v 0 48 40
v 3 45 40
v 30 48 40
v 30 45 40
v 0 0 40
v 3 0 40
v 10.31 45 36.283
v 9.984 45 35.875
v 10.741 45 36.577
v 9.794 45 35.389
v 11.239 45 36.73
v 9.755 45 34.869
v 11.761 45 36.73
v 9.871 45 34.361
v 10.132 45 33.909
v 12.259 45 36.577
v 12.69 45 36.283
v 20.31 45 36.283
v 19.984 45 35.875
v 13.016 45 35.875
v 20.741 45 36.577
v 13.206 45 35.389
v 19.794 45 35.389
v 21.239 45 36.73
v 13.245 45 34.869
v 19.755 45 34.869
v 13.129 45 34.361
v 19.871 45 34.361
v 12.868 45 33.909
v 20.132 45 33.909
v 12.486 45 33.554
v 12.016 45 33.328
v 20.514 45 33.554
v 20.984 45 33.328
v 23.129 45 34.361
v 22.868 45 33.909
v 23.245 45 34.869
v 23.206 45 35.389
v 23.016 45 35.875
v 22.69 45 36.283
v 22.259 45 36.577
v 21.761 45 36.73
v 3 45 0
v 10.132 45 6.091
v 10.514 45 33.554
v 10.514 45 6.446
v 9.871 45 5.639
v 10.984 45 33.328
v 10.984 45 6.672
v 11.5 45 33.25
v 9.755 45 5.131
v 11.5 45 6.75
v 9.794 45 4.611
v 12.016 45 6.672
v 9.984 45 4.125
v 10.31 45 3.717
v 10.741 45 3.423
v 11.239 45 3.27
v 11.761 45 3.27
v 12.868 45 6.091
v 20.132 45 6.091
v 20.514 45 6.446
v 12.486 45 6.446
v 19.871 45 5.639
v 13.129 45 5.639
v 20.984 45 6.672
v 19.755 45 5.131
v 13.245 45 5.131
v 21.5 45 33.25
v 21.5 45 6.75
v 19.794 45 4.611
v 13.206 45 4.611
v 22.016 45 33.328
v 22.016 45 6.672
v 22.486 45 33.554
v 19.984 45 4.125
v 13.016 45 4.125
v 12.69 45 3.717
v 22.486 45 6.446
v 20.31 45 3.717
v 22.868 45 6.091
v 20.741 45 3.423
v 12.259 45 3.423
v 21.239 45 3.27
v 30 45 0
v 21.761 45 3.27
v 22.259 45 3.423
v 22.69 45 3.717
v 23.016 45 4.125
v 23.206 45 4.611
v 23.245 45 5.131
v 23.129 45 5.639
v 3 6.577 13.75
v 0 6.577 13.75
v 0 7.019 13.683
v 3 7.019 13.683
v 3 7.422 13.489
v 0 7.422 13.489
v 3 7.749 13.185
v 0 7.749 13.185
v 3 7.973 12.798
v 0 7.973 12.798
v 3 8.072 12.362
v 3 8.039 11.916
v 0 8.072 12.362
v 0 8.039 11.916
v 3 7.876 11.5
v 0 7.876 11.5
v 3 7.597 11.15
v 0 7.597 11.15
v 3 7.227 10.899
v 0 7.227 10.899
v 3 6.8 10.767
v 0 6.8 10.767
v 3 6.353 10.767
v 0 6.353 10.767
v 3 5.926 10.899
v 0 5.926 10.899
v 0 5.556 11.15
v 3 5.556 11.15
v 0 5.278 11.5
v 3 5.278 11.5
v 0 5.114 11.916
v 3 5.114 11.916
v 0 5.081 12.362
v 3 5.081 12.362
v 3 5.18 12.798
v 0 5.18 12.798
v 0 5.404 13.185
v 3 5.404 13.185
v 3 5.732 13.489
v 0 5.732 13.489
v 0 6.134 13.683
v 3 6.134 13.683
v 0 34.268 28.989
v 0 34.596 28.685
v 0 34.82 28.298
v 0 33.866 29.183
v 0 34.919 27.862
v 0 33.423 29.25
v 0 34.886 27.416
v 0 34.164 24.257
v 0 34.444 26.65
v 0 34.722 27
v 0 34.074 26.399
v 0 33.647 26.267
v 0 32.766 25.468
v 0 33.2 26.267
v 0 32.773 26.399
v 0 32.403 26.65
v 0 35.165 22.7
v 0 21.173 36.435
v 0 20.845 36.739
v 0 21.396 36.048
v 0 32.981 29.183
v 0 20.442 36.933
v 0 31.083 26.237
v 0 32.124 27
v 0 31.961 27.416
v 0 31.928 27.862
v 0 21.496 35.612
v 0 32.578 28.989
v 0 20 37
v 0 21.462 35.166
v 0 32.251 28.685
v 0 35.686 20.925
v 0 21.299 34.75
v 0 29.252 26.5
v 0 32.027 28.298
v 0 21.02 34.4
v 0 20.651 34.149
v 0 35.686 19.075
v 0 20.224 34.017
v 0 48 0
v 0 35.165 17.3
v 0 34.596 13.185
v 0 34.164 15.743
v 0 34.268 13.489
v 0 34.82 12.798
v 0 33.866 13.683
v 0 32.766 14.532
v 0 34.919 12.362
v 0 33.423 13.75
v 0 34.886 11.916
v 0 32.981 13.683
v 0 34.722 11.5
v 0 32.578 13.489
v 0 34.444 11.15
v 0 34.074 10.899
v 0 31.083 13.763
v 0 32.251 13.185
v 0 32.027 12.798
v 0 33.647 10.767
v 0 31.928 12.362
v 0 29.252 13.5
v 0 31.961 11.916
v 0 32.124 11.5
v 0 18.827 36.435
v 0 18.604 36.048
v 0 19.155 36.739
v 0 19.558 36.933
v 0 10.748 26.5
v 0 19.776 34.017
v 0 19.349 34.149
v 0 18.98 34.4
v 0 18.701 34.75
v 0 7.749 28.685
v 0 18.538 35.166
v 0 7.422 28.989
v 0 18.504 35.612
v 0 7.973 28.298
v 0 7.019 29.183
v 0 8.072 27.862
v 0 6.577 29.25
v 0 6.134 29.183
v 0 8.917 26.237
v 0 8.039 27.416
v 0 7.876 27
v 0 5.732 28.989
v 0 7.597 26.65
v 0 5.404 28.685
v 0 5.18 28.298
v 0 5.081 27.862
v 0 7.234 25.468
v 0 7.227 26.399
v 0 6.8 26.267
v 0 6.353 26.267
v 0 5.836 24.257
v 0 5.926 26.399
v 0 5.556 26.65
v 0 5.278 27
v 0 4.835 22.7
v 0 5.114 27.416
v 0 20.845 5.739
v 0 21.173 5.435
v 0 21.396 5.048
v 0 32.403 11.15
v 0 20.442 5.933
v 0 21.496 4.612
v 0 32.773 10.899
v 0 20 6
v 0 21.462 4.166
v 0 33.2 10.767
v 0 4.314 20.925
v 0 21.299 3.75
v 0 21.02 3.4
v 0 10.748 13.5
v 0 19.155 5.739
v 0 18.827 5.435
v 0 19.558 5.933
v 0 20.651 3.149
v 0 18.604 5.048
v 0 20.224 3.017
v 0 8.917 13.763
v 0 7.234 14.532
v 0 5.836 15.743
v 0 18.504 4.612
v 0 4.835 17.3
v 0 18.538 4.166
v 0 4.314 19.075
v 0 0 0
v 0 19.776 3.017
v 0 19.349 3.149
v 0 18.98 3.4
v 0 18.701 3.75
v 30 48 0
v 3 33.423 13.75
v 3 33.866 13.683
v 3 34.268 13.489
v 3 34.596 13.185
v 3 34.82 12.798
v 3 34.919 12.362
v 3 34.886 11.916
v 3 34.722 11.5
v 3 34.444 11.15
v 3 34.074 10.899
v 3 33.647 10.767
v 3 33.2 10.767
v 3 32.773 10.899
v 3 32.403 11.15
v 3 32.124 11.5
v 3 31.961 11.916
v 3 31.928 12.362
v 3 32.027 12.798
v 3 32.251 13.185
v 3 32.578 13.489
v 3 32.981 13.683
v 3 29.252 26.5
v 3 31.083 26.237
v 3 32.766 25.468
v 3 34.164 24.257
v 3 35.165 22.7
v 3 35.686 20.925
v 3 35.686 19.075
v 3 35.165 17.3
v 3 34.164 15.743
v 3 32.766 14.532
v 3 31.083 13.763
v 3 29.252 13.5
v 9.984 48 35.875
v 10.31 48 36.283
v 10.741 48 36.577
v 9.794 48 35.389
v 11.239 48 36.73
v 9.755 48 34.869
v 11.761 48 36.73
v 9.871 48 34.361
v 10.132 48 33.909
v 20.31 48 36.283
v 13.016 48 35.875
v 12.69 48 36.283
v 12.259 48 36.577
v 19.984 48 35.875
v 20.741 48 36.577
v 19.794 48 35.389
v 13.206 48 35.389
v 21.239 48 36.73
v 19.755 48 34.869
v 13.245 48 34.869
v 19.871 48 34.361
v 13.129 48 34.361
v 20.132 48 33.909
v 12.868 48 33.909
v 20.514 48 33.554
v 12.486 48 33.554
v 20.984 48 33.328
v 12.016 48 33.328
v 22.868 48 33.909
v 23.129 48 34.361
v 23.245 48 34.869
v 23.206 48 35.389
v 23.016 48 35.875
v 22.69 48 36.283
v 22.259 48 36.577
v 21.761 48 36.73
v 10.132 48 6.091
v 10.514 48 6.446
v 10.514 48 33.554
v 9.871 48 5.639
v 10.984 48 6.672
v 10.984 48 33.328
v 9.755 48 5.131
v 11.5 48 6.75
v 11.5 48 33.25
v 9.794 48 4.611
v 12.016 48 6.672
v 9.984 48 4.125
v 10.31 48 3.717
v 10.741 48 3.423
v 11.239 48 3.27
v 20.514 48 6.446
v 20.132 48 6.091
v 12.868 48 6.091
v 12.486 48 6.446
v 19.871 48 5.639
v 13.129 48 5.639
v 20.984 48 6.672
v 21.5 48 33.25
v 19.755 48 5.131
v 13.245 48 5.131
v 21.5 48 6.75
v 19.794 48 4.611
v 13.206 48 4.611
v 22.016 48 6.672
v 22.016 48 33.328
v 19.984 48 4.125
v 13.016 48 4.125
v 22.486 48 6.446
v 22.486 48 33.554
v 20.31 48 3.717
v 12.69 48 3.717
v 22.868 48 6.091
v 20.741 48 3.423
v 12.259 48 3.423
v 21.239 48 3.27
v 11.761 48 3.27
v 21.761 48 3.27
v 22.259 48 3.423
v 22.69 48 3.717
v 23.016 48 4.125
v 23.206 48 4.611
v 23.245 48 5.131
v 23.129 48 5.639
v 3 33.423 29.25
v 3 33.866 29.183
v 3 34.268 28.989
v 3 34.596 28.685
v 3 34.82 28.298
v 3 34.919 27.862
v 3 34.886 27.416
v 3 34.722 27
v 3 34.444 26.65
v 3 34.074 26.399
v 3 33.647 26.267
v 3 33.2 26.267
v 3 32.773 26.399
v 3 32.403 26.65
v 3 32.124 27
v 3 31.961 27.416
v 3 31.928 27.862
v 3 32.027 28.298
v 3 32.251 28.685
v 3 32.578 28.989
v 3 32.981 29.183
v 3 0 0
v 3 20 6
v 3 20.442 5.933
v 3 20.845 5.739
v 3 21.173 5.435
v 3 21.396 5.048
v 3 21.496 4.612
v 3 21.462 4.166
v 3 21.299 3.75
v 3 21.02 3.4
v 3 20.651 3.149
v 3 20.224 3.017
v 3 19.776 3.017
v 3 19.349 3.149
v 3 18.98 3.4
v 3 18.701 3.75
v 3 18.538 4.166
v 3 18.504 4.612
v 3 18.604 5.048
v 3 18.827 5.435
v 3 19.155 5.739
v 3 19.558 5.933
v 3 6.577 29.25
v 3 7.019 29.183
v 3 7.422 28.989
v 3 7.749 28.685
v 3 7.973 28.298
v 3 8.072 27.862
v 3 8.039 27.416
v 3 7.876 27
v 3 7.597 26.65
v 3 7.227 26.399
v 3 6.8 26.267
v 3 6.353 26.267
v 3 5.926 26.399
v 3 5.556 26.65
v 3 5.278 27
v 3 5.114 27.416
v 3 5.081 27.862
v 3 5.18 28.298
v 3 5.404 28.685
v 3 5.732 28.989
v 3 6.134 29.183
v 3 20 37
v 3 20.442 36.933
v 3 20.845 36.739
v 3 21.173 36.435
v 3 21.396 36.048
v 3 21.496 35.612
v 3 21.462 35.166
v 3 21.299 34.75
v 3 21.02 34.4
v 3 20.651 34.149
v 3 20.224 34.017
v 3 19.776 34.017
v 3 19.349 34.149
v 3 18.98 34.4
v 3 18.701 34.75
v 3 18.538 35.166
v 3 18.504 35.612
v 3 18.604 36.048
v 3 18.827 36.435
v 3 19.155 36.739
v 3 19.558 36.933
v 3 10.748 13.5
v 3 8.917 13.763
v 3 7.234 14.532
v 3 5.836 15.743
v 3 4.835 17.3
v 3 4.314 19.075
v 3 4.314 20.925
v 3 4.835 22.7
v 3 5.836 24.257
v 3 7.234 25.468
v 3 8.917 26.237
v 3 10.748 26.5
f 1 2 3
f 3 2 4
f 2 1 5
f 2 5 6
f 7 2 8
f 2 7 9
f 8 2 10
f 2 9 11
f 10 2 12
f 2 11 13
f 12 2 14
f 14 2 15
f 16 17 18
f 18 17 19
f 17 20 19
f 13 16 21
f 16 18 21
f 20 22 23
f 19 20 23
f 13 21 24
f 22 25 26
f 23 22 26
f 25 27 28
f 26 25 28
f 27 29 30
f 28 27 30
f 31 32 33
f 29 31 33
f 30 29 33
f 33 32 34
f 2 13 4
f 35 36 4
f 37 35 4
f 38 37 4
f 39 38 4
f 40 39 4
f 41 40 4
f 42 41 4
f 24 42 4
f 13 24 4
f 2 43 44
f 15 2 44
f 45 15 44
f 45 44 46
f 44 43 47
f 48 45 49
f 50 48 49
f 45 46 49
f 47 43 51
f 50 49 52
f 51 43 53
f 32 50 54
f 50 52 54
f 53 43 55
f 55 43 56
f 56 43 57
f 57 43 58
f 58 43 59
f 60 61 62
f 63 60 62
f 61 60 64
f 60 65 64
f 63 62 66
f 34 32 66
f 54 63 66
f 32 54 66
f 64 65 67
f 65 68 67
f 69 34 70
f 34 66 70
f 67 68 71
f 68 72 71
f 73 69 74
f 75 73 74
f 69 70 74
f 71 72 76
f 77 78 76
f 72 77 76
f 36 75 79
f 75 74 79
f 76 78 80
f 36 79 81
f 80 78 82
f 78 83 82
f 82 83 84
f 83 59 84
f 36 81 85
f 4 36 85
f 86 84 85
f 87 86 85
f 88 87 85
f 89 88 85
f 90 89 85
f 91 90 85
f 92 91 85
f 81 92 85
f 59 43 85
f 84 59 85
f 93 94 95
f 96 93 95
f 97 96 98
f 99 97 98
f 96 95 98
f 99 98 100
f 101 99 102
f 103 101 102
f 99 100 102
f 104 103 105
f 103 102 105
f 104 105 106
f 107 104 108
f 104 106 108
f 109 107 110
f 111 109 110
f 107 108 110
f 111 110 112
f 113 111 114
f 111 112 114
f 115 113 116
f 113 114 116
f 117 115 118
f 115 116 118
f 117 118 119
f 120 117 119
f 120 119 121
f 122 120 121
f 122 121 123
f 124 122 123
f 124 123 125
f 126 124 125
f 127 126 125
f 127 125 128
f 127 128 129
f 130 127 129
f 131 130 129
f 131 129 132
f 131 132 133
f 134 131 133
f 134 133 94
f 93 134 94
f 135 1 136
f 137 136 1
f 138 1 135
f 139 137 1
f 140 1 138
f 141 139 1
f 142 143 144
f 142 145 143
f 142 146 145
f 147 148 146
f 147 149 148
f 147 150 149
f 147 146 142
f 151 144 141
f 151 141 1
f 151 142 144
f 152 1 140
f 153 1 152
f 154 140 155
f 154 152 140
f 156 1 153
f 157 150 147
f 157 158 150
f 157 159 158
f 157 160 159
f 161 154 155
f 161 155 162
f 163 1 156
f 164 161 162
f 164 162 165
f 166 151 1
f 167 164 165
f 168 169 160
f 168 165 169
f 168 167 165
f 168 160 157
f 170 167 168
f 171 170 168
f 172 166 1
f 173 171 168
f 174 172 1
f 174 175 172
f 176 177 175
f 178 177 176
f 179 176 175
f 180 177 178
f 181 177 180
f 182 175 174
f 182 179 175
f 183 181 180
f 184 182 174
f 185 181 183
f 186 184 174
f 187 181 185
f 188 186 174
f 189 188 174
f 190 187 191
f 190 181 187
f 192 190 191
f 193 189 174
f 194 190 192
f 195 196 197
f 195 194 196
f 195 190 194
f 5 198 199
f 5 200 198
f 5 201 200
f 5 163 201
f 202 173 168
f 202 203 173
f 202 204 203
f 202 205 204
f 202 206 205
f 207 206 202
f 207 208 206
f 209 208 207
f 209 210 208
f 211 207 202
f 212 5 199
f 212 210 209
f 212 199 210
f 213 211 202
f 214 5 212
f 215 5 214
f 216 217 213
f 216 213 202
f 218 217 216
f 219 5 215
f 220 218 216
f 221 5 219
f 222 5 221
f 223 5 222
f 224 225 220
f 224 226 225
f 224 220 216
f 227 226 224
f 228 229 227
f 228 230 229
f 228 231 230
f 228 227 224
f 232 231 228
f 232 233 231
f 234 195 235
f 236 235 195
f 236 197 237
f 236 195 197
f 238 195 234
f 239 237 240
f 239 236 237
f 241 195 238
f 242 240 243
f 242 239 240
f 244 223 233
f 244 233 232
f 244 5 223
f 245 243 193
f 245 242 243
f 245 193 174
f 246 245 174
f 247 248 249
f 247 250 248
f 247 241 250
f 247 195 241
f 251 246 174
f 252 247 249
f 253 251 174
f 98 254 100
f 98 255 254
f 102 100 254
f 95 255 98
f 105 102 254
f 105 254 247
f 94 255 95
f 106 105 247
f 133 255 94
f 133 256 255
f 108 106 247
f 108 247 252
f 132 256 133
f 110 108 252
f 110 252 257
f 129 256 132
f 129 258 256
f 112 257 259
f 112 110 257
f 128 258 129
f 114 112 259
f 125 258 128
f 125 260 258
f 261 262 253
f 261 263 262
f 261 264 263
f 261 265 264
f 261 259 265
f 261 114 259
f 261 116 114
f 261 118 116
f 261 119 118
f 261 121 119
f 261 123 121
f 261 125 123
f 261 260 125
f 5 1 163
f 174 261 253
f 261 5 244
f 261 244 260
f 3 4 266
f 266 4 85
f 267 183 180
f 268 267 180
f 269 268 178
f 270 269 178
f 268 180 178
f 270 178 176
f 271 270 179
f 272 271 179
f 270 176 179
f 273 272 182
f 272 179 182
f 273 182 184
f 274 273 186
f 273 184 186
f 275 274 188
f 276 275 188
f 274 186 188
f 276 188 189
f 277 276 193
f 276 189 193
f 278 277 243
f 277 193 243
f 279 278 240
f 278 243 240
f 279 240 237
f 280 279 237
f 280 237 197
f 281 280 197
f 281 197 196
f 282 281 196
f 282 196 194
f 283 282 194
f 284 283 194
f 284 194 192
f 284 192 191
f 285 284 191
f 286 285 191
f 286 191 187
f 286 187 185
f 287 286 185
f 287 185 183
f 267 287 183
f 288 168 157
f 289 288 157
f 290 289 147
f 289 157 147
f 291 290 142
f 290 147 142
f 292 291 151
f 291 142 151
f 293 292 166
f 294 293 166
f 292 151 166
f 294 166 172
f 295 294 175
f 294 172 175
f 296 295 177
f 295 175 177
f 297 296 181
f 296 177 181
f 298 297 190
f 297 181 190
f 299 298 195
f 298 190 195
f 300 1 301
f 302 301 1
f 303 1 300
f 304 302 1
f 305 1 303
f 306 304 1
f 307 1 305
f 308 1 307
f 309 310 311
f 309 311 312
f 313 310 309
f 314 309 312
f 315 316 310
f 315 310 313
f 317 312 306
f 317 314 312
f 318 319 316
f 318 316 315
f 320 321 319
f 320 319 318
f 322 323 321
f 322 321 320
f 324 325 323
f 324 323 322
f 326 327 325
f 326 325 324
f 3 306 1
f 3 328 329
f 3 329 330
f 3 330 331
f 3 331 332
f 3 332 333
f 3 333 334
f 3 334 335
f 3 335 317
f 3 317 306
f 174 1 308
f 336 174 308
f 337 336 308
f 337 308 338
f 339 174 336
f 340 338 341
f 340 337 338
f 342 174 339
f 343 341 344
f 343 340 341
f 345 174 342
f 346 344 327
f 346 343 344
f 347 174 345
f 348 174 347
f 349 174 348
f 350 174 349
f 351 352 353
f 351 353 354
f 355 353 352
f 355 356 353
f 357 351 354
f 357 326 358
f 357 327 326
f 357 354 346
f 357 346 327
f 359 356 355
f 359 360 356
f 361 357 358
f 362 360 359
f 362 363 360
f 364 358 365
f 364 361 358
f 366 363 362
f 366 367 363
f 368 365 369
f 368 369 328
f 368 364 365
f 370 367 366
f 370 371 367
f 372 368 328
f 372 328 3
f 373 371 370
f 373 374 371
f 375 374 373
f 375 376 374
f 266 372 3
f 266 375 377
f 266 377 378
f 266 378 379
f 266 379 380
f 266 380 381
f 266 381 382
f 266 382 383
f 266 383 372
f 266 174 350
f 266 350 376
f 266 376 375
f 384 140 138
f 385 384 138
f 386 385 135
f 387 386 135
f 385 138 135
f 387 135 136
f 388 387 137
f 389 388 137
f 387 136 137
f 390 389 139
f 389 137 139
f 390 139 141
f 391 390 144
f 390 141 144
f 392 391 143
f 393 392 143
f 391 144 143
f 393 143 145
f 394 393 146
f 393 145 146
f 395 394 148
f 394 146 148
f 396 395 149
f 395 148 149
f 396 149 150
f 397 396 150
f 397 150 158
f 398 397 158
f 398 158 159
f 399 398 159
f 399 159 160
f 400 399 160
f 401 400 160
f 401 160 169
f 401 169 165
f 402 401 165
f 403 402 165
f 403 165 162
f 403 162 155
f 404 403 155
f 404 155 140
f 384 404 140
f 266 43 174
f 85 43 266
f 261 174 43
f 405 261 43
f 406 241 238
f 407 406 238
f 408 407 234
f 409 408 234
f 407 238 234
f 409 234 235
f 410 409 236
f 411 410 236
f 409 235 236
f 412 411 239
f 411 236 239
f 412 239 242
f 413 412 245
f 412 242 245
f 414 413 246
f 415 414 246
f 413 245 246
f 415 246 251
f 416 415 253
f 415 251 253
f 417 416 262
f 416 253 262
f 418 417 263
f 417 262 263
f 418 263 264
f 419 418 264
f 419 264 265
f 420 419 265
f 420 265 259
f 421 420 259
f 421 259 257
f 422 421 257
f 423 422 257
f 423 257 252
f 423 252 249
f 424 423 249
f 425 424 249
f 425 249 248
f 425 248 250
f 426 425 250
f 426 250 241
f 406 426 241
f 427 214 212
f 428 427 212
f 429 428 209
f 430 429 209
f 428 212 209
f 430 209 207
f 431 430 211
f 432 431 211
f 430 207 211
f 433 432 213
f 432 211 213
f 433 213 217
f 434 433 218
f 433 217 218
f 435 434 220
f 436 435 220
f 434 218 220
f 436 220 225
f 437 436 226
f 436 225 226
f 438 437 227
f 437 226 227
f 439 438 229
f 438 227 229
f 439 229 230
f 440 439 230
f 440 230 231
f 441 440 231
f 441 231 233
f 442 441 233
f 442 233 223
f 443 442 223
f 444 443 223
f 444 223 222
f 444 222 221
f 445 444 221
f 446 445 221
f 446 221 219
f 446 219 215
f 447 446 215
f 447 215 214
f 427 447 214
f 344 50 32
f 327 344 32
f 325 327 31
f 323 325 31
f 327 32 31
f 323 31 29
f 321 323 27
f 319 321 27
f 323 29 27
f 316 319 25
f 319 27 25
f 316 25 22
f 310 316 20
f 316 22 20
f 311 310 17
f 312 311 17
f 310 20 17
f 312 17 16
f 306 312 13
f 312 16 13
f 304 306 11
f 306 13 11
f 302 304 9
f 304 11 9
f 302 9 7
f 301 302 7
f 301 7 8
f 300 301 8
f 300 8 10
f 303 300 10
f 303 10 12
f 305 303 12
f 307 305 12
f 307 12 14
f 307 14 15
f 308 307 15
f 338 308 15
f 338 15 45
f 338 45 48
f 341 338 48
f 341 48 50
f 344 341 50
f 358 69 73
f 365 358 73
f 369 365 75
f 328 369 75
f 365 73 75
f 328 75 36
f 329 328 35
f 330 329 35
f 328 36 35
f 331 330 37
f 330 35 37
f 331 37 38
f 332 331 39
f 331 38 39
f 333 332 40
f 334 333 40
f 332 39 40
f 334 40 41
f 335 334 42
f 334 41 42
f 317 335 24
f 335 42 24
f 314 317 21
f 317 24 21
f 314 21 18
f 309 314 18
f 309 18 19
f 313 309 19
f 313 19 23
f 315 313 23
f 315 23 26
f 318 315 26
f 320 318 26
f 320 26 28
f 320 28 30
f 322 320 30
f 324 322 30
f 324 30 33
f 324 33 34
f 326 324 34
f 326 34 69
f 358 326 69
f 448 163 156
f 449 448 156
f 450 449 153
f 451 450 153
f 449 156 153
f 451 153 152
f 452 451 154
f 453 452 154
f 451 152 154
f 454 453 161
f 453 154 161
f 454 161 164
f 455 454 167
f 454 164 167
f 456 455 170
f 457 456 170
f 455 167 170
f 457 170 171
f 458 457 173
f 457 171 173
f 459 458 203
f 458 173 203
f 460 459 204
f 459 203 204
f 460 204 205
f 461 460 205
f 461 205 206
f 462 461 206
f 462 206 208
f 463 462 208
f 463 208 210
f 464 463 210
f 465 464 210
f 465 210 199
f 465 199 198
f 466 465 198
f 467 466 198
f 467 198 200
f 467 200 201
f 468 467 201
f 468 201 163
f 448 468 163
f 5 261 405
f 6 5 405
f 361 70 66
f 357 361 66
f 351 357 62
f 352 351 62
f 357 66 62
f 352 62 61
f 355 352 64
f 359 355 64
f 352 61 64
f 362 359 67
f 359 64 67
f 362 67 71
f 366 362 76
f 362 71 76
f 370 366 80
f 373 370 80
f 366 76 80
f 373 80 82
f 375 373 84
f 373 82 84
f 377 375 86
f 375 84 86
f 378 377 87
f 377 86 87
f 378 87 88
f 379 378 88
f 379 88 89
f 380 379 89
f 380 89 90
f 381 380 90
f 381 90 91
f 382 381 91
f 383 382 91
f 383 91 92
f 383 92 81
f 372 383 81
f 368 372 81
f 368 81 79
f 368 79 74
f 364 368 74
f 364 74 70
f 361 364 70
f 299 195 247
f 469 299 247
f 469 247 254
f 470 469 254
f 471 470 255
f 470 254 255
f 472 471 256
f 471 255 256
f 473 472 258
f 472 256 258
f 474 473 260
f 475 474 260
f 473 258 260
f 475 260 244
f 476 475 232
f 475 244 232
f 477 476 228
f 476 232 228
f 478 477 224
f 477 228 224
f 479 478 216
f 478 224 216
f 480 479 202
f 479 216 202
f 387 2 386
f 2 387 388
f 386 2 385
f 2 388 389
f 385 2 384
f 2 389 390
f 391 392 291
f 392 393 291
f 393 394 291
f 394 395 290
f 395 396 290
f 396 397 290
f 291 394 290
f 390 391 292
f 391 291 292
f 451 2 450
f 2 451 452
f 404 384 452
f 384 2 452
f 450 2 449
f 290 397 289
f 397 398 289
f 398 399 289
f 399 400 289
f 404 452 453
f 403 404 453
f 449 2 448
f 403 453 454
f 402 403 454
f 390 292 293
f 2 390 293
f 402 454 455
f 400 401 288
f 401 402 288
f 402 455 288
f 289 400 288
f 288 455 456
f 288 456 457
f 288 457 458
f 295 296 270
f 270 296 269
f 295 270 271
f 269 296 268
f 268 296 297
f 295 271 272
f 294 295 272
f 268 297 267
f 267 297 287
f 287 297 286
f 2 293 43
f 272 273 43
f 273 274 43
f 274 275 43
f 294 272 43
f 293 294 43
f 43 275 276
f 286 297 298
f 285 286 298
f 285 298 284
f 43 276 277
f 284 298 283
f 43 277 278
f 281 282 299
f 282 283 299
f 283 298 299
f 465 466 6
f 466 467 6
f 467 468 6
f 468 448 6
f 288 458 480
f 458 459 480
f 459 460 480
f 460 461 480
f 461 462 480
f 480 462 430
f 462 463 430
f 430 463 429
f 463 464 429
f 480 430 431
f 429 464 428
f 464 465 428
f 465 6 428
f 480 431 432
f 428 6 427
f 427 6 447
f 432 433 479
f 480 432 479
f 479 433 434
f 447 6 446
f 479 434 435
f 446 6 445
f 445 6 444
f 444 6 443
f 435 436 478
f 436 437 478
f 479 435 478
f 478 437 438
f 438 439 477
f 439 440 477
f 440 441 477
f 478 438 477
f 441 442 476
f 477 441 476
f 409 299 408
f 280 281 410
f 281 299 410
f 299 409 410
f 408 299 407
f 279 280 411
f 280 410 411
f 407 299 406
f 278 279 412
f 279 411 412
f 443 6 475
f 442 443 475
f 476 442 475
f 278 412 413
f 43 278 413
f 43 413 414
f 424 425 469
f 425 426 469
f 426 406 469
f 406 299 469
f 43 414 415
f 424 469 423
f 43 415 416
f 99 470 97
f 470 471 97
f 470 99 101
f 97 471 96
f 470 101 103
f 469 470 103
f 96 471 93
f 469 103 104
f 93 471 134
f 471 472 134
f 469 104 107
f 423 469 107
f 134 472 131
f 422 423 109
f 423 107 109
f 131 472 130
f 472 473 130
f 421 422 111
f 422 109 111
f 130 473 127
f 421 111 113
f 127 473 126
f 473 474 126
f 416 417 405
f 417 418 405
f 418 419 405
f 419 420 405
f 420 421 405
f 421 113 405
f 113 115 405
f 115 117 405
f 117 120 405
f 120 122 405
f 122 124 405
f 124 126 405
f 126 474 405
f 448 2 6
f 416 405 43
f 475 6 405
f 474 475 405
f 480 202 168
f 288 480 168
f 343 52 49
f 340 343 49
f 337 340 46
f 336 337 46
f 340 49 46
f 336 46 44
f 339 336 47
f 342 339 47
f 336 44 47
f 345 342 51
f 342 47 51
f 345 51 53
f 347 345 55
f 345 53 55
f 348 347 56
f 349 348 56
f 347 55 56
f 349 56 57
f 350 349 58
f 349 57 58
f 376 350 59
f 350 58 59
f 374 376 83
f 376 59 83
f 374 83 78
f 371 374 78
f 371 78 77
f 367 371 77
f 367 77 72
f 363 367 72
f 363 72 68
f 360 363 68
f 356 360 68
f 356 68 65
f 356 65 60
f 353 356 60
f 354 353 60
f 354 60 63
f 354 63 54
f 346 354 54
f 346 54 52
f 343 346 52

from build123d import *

# Parameters (mm, degrees)
SKETCH_1_W          = 30
SKETCH_1_H          = 40
EXTRUDE_1_DEPTH     = 48
SHELL_1_T           = -3
SKETCH_2_R          = 1.75
CUT_EXTRUDE_1_DEPTH = 68.268120235
SKETCH_3_R          = 1.5
CUT_EXTRUDE_3_DEPTH = 70.310893805


with BuildPart() as part:
    # 草图1 → 凸台-拉伸1 (new body)
    with BuildSketch(Plane(origin=(0, 0, 0), x_dir=(1, 0, 0), z_dir=(0, 1, 0))):
        with Locations((15, -20)):
            Rectangle(SKETCH_1_W, SKETCH_1_H)
    extrude(amount=EXTRUDE_1_DEPTH)

    # 抽壳1
    shell_1_openings = [part.faces().sort_by_distance(p)[0] for p in [
        (15, 0, 20),
        (15, 24, 0),
        (30, 24, 20),
        (15, 24, 40),
    ]]
    offset(amount=SHELL_1_T, openings=shell_1_openings, kind=Kind.INTERSECTION)

    # 草图2 → 切除-拉伸1 (cut, through all)
    with BuildSketch(Plane.XZ.offset(-45)):
        with Locations(Location((11.5, 35, 0), (0, 0, 270))):
            Circle(SKETCH_2_R)
        with Locations(Location((21.5, 35, 0), (0, 0, 270))):
            Circle(SKETCH_2_R)
        with Locations(Location((21.5, 5, 0), (0, 0, 90))):
            Circle(SKETCH_2_R)
        with Locations(Location((11.5, 5, 0), (0, 0, 90))):
            Circle(SKETCH_2_R)
    extrude(amount=-CUT_EXTRUDE_1_DEPTH, mode=Mode.SUBTRACT)

    # 草图3 → 切除-拉伸3 (cut, through all)
    with BuildSketch(Plane.ZY):
        with Locations((27.75, 6.576606241)):
            Circle(SKETCH_3_R)
        with Locations((12.25, 6.576606241)):
            Circle(SKETCH_3_R)
        with Locations((4.5, 20)):
            Circle(SKETCH_3_R)
        with Locations((12.25, 33.423393759)):
            Circle(SKETCH_3_R)
        with Locations((27.75, 33.423393759)):
            Circle(SKETCH_3_R)
        with Locations((35.5, 20)):
            Circle(SKETCH_3_R)
        with BuildLine():
            Line((26.5, 20), (26.5, 29.252110748))
            ThreePointArc((26.5, 29.252110748), (20, 35.752110748), (13.5, 29.252110748))
            Line((13.5, 29.252110748), (13.5, 20))
            Line((13.5, 20), (13.5, 10.747889252))
            ThreePointArc((13.5, 10.747889252), (20, 4.247889252), (26.5, 10.747889252))
            Line((26.5, 10.747889252), (26.5, 20))
        make_face()
    extrude(amount=-CUT_EXTRUDE_3_DEPTH, mode=Mode.SUBTRACT)


solid = part.part
